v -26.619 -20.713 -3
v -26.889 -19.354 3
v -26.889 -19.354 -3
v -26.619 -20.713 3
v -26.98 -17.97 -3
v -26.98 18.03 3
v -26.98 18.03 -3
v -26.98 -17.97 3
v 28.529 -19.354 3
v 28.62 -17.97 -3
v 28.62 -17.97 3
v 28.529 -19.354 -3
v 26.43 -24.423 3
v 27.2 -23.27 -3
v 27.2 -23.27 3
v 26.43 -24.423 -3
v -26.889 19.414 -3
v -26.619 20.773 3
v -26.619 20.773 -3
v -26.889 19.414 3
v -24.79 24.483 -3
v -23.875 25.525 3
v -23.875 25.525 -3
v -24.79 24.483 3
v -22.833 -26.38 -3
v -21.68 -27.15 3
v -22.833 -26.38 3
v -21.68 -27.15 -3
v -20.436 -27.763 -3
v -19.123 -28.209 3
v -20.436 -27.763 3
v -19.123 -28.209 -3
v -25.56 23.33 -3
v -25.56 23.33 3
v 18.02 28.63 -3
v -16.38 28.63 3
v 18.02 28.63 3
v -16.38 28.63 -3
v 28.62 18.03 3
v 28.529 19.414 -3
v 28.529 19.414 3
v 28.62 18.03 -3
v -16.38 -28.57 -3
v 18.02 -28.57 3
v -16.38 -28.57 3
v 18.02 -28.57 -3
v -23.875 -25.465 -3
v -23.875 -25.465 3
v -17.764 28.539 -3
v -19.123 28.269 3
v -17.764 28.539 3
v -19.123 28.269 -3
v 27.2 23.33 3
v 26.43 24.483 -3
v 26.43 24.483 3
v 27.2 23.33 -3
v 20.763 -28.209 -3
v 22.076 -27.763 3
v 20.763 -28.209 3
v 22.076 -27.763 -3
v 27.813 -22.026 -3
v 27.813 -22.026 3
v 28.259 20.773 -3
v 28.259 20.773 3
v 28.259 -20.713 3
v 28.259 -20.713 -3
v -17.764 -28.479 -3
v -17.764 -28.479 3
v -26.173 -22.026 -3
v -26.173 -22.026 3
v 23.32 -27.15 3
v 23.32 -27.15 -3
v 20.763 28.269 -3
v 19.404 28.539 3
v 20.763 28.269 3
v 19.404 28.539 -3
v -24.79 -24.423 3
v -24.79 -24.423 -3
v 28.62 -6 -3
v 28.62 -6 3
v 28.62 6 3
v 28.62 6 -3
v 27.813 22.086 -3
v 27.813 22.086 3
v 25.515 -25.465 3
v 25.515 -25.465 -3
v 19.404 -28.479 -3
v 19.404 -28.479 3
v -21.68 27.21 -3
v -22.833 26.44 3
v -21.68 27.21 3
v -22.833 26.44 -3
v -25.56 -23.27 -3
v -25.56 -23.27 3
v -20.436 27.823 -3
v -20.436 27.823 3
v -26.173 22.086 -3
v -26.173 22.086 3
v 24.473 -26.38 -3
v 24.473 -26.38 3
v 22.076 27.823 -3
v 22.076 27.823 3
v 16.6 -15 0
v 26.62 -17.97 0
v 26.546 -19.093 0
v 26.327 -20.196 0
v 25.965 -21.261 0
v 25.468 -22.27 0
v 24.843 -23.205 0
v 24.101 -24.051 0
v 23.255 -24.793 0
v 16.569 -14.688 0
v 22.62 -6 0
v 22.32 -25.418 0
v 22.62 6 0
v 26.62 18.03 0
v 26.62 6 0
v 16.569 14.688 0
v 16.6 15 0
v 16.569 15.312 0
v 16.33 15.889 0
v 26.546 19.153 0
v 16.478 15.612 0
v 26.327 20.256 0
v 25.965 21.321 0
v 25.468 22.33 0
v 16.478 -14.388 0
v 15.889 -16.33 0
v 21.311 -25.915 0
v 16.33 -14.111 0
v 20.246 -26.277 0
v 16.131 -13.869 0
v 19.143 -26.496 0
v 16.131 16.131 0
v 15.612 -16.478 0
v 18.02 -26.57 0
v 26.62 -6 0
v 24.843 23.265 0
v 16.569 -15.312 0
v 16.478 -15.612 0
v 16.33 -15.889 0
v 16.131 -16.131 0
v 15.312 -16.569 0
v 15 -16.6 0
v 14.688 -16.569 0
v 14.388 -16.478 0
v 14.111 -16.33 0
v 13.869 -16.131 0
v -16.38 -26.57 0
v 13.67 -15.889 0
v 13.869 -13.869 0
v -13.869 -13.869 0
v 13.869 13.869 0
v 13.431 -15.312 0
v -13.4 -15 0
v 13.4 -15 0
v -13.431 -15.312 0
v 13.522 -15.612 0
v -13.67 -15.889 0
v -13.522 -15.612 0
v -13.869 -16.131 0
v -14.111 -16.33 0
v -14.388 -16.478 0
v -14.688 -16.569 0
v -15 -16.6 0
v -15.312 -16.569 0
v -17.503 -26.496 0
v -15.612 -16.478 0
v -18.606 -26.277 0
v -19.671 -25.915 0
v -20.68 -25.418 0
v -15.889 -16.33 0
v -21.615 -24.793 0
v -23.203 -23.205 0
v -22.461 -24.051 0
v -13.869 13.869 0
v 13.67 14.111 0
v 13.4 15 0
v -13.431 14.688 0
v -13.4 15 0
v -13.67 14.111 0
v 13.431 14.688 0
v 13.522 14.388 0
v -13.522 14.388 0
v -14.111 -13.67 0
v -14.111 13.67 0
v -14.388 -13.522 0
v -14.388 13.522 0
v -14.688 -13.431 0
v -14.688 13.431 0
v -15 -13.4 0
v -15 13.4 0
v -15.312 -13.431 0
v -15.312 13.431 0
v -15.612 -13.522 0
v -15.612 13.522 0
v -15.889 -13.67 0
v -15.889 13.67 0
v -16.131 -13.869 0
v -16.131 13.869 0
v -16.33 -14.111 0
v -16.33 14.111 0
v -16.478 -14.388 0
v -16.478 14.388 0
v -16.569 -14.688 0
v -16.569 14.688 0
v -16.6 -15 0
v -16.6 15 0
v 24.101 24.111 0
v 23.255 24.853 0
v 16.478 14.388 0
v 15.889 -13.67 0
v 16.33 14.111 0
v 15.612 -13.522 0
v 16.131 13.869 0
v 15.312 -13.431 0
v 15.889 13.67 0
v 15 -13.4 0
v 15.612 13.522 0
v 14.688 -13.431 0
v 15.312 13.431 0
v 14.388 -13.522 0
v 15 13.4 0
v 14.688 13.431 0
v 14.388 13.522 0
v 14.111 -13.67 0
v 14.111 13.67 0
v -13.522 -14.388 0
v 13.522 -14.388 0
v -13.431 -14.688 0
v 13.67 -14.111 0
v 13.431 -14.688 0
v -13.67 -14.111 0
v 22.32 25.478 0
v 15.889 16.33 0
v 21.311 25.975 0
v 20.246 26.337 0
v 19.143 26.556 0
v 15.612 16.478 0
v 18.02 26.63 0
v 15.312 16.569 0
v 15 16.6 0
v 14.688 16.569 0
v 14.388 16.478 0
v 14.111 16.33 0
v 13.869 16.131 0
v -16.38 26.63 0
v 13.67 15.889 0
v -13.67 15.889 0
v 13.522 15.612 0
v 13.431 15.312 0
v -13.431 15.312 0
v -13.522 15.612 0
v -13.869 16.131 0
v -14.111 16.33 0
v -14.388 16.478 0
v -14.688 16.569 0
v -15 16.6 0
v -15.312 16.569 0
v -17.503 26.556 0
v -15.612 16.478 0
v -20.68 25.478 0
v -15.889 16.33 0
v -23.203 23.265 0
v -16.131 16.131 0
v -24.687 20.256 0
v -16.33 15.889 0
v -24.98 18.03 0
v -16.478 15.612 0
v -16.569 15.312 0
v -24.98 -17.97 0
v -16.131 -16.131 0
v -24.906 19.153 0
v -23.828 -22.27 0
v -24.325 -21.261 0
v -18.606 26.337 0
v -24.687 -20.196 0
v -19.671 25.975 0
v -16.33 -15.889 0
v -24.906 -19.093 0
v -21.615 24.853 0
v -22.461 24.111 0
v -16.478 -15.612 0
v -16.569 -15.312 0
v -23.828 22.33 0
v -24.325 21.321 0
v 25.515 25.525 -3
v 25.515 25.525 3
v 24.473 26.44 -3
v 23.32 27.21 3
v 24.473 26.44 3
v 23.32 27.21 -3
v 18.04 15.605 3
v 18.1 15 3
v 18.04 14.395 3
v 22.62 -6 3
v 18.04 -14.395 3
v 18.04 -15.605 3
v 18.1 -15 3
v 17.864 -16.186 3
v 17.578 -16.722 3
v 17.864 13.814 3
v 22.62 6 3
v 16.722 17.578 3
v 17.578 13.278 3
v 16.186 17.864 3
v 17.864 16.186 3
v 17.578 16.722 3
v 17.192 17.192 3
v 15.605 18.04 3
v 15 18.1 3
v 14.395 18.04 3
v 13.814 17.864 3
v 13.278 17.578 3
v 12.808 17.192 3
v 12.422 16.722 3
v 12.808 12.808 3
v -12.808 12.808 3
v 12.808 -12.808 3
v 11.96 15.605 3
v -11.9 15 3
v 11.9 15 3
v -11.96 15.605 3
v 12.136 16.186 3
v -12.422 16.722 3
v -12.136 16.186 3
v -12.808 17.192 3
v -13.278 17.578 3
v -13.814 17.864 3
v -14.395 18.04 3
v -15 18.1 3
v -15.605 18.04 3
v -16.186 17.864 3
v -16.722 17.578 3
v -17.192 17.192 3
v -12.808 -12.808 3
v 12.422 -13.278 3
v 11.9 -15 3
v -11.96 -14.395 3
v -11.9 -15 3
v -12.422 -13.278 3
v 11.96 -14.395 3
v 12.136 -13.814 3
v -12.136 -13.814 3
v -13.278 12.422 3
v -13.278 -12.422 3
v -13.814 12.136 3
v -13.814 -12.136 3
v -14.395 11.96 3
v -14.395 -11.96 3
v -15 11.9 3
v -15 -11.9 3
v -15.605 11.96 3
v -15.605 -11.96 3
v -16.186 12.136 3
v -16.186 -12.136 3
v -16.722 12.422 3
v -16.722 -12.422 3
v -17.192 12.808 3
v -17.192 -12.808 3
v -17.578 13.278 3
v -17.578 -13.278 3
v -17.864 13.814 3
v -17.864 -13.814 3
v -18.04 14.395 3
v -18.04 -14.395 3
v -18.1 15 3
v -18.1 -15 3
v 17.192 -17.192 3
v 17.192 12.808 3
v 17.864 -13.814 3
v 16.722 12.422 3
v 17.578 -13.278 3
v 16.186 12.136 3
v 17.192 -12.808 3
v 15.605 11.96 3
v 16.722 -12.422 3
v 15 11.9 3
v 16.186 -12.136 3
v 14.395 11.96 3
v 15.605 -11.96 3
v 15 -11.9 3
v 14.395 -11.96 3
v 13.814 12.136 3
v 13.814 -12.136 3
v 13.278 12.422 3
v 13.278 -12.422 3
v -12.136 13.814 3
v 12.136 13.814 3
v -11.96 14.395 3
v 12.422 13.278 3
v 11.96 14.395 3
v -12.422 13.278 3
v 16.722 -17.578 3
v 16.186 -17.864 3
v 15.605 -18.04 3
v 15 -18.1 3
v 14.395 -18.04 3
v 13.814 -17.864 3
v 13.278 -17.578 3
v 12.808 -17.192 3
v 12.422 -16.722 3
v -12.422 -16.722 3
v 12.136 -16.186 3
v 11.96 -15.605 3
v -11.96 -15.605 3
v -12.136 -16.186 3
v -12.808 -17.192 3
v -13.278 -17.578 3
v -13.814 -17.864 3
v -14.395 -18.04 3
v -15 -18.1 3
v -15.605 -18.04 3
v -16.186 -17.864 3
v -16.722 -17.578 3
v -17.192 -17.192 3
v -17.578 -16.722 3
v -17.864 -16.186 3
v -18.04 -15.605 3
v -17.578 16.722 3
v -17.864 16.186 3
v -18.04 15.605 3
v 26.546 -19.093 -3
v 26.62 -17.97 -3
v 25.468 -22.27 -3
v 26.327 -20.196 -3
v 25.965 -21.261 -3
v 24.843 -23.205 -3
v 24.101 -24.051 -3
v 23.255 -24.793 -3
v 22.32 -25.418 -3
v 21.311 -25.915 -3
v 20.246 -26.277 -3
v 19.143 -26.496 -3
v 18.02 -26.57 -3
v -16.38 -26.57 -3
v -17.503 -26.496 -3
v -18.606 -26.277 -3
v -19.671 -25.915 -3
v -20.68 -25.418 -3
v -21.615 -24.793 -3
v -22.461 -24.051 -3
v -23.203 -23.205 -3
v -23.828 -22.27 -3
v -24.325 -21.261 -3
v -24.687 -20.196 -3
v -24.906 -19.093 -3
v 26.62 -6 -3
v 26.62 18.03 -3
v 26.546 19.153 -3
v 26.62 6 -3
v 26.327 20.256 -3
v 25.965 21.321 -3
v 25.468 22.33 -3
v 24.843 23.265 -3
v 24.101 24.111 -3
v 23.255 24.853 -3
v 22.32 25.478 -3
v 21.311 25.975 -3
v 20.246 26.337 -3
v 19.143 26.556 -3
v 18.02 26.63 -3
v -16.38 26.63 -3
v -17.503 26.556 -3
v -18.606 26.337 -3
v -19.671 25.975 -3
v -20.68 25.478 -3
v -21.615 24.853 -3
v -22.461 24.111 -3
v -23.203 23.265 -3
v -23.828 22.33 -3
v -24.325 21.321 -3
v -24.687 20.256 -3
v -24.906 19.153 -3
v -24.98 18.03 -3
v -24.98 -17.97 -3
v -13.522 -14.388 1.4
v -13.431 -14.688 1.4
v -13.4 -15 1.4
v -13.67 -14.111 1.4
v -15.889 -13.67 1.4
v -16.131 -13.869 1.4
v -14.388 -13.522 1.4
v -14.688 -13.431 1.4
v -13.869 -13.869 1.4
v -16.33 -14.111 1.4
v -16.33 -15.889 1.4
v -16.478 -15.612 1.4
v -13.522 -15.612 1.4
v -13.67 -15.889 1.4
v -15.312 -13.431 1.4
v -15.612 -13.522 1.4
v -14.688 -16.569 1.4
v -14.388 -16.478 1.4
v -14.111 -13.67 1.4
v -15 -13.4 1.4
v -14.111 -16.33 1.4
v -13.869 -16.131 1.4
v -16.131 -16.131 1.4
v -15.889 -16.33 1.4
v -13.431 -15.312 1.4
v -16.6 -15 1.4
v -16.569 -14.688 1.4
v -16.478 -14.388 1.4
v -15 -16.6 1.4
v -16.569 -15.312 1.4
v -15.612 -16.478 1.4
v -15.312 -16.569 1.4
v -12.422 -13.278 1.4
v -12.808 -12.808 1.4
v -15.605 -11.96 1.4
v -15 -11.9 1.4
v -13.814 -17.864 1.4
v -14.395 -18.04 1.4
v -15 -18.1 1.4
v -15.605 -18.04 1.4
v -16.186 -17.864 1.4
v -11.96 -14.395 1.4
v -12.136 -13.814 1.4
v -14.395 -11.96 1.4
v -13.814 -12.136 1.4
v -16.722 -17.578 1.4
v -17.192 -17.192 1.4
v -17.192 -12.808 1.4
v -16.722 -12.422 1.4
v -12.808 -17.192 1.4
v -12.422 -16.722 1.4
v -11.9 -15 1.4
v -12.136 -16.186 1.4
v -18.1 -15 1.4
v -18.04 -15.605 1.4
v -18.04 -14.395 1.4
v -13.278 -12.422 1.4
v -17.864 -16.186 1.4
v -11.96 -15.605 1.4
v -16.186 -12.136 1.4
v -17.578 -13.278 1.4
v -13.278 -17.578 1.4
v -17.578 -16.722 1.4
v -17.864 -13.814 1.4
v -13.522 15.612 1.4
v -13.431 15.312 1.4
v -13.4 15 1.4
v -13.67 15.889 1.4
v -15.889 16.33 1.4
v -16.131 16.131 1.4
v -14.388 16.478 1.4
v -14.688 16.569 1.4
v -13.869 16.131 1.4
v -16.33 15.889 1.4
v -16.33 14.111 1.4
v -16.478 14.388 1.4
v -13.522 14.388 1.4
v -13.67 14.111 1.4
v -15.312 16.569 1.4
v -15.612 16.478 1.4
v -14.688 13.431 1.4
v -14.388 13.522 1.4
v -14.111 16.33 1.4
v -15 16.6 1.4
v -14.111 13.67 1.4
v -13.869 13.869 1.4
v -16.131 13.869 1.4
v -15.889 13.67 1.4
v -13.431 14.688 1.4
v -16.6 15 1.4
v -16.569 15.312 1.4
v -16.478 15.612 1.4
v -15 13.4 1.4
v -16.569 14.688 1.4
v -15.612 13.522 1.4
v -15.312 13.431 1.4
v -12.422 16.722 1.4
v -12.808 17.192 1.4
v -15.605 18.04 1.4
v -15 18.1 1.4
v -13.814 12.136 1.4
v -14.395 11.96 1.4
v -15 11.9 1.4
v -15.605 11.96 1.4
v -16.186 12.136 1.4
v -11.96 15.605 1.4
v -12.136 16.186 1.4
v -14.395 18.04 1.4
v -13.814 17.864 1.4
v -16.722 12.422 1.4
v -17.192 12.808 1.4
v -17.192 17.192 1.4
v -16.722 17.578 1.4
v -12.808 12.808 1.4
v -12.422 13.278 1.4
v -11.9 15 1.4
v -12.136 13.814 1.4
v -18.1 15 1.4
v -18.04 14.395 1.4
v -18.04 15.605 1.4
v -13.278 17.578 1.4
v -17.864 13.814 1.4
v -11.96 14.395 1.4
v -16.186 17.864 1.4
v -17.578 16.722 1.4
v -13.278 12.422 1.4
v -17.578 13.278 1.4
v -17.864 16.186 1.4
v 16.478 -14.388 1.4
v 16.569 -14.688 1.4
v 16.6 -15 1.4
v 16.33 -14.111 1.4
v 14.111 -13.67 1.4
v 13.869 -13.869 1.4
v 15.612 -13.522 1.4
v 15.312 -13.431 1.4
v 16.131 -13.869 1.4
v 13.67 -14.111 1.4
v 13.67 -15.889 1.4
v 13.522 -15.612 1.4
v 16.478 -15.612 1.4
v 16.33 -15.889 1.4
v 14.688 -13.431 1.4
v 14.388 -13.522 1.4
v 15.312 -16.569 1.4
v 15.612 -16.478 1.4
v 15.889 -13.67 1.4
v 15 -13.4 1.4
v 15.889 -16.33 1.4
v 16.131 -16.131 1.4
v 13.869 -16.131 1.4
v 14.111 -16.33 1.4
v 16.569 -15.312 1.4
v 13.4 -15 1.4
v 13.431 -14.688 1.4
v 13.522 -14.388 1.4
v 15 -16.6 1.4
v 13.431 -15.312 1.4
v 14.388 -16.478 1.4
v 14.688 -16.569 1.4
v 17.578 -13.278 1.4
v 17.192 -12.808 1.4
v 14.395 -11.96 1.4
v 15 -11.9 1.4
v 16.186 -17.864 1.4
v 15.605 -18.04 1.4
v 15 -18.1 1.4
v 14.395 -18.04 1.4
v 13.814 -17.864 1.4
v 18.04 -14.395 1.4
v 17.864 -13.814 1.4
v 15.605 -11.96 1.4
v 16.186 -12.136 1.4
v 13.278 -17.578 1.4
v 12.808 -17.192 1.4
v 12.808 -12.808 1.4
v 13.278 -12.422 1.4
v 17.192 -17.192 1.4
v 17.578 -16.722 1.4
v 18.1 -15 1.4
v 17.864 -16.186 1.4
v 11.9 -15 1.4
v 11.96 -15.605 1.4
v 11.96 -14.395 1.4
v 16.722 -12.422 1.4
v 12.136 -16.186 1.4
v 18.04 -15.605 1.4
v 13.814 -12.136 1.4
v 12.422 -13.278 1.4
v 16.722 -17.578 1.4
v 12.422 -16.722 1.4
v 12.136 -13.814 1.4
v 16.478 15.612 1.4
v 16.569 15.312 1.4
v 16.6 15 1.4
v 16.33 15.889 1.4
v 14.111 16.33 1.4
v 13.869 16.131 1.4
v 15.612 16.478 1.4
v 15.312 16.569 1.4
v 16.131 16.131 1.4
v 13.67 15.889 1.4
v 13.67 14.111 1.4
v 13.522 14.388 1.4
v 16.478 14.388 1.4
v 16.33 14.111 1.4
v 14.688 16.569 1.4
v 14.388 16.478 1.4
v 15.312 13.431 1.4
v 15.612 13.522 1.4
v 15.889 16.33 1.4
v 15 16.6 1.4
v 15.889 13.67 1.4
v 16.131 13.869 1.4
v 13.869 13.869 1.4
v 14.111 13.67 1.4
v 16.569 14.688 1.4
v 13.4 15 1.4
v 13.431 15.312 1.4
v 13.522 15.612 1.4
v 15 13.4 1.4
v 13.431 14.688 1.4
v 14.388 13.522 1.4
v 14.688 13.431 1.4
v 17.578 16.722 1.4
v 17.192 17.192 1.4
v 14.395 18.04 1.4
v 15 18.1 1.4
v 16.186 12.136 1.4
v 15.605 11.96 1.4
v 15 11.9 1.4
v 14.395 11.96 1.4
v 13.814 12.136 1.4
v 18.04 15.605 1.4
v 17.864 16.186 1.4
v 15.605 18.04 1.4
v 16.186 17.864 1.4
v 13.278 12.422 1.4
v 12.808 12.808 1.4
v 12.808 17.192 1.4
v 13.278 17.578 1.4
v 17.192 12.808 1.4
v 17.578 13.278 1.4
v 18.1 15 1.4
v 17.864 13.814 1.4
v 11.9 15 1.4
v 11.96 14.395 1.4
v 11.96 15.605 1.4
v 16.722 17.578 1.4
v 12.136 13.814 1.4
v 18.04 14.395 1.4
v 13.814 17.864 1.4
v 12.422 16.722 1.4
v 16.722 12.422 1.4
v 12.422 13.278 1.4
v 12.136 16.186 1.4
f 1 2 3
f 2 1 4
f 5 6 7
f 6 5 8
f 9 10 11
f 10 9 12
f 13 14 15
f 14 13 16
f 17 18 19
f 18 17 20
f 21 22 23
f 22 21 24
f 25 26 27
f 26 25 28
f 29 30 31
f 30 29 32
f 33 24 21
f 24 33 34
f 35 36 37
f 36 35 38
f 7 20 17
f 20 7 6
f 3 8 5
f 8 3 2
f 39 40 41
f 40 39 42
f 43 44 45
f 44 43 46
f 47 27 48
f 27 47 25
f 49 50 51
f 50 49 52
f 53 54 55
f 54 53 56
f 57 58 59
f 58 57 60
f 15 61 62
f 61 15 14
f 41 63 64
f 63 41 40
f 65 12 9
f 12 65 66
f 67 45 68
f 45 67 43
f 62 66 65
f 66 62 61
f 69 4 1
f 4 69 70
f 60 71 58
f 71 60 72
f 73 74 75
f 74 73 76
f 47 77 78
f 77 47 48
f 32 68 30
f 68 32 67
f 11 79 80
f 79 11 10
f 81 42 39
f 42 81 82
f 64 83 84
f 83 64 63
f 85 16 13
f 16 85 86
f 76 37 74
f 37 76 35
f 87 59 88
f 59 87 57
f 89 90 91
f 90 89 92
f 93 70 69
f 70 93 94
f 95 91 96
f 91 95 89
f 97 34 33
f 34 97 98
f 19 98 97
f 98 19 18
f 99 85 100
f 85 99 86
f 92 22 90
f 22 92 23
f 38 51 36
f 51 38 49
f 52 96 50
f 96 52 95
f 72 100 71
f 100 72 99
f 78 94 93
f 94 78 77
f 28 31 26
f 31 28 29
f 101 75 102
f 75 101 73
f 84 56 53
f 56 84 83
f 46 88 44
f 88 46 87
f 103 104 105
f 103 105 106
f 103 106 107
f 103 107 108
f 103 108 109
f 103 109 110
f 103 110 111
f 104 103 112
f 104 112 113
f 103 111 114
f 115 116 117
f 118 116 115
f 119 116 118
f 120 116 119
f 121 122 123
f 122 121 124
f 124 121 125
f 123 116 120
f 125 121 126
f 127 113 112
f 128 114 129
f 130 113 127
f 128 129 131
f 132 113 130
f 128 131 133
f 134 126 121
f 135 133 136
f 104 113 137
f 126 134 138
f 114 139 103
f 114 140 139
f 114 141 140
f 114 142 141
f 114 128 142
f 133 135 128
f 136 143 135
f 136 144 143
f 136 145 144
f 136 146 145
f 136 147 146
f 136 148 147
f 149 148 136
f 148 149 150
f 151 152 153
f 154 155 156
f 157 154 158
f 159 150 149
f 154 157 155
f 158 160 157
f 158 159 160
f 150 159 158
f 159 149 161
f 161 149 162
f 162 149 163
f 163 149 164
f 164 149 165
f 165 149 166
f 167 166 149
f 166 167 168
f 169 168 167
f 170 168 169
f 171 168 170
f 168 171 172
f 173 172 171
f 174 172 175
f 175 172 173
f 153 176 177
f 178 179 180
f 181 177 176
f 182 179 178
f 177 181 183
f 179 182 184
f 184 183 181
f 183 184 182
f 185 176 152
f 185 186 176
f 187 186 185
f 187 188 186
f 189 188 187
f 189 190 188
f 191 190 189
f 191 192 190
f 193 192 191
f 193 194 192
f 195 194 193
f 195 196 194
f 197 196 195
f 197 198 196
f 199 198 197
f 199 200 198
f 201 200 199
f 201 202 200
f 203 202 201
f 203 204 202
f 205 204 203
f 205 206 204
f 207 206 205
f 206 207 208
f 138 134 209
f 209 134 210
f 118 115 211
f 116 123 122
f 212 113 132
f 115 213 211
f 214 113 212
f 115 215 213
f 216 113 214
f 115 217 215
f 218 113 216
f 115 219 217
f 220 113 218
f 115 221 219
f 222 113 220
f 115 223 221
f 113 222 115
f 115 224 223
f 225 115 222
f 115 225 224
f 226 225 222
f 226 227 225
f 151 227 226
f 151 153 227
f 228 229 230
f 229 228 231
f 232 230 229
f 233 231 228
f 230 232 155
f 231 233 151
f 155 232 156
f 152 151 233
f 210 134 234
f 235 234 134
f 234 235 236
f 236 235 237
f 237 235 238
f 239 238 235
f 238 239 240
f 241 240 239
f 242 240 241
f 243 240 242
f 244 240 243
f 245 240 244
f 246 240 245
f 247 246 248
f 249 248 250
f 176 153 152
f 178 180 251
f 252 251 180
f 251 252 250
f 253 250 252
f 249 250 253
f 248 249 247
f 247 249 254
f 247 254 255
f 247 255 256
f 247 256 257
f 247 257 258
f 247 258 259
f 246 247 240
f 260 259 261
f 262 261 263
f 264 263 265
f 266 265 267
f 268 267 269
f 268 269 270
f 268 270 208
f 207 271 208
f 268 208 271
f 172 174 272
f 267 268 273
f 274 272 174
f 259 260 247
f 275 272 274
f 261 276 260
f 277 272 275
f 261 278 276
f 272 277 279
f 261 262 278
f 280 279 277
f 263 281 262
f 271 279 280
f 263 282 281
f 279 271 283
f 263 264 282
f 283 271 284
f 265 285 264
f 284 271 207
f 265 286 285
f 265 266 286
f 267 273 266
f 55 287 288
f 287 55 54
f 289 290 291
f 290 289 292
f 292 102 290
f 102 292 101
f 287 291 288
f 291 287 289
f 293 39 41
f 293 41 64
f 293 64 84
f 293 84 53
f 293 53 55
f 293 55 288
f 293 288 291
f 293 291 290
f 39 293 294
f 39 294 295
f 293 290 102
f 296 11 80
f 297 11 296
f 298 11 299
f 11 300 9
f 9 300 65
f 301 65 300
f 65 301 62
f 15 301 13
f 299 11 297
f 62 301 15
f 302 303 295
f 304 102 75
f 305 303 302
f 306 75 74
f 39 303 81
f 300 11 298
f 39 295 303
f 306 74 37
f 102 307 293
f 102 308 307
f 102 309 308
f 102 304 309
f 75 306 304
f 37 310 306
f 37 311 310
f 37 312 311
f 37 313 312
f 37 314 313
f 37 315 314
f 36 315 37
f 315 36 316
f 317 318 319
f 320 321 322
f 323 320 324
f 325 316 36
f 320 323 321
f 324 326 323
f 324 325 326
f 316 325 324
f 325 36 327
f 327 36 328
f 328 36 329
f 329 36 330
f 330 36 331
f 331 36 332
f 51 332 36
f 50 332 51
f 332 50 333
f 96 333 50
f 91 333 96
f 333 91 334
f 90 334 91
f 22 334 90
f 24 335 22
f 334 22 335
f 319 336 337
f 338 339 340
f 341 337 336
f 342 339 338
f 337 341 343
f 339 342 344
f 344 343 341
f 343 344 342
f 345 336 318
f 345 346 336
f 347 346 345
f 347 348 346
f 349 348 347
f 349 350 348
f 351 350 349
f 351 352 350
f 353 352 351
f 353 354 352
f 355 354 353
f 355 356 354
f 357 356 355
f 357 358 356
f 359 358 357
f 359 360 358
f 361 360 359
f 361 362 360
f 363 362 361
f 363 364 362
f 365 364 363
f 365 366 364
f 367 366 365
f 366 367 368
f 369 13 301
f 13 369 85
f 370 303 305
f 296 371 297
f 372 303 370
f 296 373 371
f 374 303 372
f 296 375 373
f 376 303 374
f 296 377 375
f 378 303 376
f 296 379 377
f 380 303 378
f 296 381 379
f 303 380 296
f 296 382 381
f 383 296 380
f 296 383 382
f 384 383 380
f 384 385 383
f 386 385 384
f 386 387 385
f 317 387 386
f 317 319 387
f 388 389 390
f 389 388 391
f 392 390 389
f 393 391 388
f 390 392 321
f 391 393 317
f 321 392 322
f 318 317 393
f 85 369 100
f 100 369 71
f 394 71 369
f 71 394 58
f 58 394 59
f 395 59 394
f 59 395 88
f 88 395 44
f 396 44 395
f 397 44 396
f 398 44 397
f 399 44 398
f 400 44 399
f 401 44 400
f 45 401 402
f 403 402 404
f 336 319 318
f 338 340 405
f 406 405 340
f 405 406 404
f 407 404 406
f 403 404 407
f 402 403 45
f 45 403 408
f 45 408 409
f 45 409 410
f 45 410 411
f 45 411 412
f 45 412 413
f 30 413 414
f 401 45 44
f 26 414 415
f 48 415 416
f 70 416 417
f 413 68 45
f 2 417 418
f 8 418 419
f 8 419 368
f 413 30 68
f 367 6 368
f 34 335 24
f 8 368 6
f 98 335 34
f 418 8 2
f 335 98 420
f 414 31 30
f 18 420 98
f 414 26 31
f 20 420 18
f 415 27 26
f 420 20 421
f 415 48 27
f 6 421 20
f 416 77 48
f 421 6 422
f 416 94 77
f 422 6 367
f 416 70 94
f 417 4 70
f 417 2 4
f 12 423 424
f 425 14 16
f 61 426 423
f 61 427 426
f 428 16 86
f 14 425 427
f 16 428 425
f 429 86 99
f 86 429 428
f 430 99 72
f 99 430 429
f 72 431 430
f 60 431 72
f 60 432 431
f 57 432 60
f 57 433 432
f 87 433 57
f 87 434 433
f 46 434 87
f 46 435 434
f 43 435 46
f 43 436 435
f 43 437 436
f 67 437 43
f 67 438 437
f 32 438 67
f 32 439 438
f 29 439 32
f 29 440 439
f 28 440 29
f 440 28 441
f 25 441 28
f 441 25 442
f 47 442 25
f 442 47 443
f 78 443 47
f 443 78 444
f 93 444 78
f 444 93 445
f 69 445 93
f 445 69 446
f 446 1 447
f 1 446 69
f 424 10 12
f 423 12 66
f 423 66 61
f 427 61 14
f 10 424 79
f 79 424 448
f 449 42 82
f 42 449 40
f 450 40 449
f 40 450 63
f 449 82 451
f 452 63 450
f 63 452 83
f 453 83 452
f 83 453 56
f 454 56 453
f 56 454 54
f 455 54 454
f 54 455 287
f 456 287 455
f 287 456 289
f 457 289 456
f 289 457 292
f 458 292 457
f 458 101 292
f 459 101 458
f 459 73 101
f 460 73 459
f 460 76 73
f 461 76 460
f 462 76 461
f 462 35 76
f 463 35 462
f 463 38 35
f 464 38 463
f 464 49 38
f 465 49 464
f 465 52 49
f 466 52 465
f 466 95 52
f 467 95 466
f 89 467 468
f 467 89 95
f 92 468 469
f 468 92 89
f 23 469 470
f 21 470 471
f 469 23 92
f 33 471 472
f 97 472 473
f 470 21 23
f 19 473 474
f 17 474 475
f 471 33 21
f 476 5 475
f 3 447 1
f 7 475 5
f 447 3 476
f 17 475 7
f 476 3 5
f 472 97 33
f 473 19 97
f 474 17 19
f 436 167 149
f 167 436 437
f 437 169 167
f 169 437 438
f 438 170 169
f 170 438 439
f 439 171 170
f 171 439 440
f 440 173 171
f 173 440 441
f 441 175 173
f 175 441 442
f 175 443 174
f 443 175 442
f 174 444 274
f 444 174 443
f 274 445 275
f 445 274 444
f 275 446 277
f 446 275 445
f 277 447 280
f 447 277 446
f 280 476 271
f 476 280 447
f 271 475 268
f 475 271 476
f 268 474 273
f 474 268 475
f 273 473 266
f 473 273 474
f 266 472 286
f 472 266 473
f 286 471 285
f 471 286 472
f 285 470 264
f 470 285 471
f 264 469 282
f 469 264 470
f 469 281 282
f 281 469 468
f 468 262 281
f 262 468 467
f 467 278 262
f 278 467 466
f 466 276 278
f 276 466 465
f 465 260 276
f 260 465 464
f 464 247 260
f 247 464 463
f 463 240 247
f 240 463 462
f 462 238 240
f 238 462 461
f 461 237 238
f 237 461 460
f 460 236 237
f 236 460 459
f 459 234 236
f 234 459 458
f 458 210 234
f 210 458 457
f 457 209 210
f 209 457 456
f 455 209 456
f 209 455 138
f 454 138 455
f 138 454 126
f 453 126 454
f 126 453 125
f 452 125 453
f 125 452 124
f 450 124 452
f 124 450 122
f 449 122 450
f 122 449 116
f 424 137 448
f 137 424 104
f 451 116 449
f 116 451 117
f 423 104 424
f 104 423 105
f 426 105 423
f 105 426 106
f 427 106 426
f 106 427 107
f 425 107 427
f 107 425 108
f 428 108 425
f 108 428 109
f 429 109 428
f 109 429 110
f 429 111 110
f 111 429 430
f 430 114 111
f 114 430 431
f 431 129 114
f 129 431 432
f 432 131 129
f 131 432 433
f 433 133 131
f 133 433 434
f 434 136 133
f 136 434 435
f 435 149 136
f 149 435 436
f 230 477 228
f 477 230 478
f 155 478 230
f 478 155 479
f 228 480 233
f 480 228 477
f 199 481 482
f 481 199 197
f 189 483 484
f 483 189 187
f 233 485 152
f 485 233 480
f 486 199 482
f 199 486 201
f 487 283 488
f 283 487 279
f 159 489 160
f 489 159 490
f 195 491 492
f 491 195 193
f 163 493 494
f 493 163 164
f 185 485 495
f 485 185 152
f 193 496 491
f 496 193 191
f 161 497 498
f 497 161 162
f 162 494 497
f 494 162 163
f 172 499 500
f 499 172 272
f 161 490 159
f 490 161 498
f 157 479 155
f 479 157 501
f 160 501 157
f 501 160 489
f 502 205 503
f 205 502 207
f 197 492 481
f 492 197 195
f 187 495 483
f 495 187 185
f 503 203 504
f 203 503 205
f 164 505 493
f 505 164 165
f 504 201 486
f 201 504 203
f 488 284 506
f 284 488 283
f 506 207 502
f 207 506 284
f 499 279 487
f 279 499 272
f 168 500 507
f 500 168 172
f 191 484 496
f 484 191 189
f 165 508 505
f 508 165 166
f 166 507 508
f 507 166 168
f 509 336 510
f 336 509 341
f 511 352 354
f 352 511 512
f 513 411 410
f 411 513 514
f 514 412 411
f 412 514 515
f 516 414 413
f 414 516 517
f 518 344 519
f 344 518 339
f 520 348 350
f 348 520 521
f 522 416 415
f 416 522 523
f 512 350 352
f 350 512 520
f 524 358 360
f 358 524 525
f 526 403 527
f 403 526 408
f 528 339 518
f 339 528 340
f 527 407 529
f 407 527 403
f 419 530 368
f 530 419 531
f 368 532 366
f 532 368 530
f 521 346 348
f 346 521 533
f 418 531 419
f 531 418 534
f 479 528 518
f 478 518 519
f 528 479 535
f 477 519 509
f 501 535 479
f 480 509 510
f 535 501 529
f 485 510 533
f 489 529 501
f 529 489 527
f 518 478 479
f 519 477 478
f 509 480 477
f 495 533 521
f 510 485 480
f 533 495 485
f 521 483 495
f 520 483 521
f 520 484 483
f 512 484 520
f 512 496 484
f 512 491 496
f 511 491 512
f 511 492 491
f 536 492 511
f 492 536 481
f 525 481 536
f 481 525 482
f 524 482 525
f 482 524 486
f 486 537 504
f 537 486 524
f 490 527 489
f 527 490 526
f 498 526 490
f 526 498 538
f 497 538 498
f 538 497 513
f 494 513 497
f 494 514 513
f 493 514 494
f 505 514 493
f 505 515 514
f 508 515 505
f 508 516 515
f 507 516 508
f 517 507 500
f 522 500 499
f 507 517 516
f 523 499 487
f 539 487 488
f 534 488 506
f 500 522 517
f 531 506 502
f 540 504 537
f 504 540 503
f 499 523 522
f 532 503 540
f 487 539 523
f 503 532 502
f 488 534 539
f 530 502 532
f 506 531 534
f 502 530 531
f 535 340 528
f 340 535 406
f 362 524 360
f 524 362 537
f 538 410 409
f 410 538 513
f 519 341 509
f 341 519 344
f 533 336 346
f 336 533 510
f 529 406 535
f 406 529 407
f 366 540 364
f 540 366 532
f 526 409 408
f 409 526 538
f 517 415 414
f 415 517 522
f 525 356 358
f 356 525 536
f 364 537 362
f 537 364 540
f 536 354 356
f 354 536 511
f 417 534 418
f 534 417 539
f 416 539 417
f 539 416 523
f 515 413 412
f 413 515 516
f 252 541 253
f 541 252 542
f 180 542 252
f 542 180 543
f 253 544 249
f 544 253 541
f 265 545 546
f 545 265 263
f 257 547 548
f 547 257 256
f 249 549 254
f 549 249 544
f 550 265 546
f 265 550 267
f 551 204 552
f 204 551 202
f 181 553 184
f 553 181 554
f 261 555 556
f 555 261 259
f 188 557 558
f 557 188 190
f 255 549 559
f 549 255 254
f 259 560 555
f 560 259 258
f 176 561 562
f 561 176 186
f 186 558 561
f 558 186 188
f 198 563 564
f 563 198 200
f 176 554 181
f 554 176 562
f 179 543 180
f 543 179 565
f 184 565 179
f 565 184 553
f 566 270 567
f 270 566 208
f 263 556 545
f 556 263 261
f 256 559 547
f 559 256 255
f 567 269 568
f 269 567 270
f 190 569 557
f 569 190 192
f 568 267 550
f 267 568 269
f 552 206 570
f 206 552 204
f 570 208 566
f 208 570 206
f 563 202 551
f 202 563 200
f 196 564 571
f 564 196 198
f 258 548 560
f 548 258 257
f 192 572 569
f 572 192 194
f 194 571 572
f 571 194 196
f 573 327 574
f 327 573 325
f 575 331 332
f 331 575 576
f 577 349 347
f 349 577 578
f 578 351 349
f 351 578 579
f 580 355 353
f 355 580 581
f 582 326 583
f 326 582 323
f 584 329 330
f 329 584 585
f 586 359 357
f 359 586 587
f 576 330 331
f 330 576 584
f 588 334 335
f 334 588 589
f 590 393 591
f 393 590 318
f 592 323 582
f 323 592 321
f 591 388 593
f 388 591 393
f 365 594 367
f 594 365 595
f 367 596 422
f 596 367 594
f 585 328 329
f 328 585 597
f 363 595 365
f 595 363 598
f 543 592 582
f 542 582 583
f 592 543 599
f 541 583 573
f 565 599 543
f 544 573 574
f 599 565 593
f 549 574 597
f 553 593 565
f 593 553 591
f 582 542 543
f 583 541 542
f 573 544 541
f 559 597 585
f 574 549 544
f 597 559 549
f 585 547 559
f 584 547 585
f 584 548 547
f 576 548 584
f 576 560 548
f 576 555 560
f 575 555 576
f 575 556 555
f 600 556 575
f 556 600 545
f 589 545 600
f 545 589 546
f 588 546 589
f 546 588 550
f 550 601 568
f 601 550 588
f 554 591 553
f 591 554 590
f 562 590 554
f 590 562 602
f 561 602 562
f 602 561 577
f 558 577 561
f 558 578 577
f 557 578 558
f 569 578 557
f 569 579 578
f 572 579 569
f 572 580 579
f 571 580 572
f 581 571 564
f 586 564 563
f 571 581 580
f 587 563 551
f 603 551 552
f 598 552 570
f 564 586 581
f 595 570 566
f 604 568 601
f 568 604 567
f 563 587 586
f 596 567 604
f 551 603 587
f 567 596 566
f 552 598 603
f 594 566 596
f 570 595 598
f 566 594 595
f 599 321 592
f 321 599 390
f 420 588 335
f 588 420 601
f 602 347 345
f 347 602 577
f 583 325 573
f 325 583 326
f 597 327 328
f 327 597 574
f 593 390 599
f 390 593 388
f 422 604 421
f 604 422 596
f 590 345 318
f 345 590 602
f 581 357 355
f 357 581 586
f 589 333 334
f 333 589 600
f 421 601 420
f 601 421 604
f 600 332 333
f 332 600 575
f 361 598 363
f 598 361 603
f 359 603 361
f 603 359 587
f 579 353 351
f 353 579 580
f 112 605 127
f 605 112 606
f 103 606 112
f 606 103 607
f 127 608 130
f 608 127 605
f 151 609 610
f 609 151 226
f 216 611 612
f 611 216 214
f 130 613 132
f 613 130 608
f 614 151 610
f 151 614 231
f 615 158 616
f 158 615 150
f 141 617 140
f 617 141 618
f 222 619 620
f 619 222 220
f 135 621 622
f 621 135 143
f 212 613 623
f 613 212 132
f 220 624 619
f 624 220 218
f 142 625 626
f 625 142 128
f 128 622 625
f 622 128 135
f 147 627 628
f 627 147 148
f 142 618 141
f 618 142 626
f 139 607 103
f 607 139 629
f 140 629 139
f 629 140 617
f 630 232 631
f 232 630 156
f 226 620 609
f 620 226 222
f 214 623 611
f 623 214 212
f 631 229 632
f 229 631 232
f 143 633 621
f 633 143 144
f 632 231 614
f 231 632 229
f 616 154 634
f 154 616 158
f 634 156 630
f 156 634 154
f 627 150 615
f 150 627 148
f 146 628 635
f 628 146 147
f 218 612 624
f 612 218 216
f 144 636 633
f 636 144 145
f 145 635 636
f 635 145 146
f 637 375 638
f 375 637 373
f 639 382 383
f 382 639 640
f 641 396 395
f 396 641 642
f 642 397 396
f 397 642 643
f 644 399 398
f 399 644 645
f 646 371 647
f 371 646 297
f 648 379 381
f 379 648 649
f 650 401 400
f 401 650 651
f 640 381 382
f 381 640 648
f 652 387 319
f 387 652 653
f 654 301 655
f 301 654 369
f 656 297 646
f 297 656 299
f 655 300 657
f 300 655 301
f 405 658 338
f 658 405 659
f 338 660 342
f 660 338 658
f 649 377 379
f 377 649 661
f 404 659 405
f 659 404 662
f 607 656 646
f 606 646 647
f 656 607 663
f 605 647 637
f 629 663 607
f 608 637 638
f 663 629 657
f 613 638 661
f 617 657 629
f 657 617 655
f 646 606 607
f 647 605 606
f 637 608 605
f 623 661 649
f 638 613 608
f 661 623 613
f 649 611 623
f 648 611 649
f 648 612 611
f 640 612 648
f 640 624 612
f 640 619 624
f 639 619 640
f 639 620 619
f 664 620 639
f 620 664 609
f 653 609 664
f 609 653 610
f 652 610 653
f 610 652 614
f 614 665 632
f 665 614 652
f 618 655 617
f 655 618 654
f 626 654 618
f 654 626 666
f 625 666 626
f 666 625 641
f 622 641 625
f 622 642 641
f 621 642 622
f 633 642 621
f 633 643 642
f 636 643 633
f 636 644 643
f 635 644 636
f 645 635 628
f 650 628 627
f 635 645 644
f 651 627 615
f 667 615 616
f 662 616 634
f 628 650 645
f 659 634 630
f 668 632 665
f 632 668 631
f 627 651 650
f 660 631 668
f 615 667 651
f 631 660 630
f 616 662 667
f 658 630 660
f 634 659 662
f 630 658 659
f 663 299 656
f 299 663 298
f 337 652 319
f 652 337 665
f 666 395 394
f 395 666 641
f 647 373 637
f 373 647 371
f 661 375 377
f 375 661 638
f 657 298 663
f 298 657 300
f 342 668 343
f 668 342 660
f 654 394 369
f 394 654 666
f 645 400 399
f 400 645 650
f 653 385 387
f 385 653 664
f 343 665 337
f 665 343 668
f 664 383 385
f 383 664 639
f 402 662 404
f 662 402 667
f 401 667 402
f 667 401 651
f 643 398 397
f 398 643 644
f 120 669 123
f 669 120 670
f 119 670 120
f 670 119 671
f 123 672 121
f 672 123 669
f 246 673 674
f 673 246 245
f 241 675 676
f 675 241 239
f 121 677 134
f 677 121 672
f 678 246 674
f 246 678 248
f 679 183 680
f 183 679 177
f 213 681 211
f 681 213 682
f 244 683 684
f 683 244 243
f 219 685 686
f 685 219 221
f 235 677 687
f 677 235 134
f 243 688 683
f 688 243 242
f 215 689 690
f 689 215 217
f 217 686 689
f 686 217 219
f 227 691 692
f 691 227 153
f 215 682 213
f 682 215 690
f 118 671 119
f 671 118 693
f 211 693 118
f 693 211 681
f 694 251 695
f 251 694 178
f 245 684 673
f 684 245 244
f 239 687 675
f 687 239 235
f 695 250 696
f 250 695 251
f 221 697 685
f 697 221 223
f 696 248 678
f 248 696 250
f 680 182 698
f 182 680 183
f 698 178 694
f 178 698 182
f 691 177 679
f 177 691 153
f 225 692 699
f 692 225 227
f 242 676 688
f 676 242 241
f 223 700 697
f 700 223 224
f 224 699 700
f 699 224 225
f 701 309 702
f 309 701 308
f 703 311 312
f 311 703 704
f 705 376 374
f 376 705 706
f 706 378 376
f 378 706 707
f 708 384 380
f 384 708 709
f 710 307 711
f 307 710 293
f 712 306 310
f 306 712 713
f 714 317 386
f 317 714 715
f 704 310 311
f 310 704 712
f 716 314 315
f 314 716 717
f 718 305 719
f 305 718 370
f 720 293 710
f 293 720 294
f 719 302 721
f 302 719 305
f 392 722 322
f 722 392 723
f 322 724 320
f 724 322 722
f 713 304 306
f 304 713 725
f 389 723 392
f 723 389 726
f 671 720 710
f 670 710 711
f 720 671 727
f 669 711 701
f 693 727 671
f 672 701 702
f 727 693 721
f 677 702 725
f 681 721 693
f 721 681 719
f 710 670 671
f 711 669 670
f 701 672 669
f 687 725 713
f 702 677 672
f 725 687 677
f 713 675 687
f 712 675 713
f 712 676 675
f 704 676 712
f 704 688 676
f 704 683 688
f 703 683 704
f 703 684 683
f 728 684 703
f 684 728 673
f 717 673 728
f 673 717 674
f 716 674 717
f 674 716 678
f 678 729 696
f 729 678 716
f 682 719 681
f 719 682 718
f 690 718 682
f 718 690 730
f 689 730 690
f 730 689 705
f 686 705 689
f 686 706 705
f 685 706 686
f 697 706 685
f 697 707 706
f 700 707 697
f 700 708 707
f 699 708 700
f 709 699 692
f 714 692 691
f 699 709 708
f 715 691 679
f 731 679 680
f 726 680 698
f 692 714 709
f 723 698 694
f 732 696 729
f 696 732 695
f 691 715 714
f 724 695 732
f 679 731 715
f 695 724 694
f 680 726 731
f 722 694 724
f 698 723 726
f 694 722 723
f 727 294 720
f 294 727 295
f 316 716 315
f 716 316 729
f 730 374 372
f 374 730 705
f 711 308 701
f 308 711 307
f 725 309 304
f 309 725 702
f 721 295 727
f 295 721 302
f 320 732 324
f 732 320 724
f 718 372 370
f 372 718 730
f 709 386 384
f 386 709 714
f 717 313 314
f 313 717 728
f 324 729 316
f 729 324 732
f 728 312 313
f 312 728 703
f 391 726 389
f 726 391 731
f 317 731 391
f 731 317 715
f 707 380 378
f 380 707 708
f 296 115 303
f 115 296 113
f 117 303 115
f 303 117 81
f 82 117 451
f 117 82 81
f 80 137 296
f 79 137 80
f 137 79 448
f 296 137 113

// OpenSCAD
// ============================================================================
// top_lid_xiao_001.scad — NẮP ĐẬY TRÊN CÙNG baseline XIAO ESP32-S3 Sense (IN MỚI)
// ----------------------------------------------------------------------------
// Đậy board XIAO ngồi trong top_cap (base Matchboxscope): chắn bụi/sáng từ trên,
// giữ board, luồn cáp USB-C ra. CÙNG giao diện 4×M3 30×30 như lid Matchboxscope
// in sẵn, nhưng IN DÀY hơn cho cứng + có KHE CÁP USB-C + GỜ ĐỊNH VỊ ôm ngoài miệng.
//
// Kết cấu (gốc: TRỤC QUANG = Z tại gốc; MẶT DƯỚI tấm nắp = z=0, +Z lên):
//  - Tấm nắp rounded-rect (footprint = outline base + gờ), dày lid_x_t, z=0..lid_x_t.
//  - GỜ ĐỊNH VỊ thò xuống z=−lid_x_lip_h..0: hốc trong ôm ngoài miệng base
//    (khe lid_x_lip_clr rộng rãi — 4 vít định vị chính, gờ chỉ chắn sáng/bụi).
//    Base chui LÊN vào hốc, mặt trên base chạm mặt dưới tấm nắp.
//  - 4 lỗ THÔNG M3 Ø3.2 (bước 30×30, tâm=trục quang) + khoét đầu vít: vít M3
//    tự-ren vào NỬA TRÊN 4 lỗ base (nửa dưới dành cho vít bích ống — lỗ base sâu
//    12mm nên 2 vít ngắn không chạm nhau; đây đúng ý đồ base+lid gốc Matchboxscope).
//  - KHE CÁP USB-C ở cạnh +X (cắt hết gờ + mép tấm): cáp thoát ra từ dưới tấm.
// Assembly đặt nắp tại mặt trên base (global z = z_tube_top + cap_h).
// ============================================================================
include <../constants.scad>

EPS = 0.05;

// footprint hốc (ôm base) và tấm nắp (= hốc + vách gờ)
recess_dims = [cap_outline[0] + 2*lid_x_lip_clr, cap_outline[1] + 2*lid_x_lip_clr];
recess_r    = cap_corner_r + lid_x_lip_clr;
outer_dims  = [recess_dims[0] + 2*lid_x_lip_wall, recess_dims[1] + 2*lid_x_lip_wall];
outer_r     = recess_r + lid_x_lip_wall;

module rrect(dims, r) {
    hull() for (sx = [1, -1], sy = [1, -1])
        translate([sx*(dims[0]/2 - r), sy*(dims[1]/2 - r)]) circle(r = r, $fn = 48);
}

module top_lid_xiao() {
    color(col_plastic) difference() {
        union() {
            // Tấm nắp (z=0..lid_x_t)
            translate([cap_outline_off[0], cap_outline_off[1], 0])
                linear_extrude(lid_x_t) rrect(outer_dims, outer_r);
            // Gờ định vị (vành thò xuống z=−lip_h..0)
            translate([cap_outline_off[0], cap_outline_off[1], -lid_x_lip_h])
                linear_extrude(lid_x_lip_h)
                    difference() {
                        rrect(outer_dims, outer_r);
                        rrect(recess_dims, recess_r);
                    }
        }
        // 4 lỗ thông M3 (xuyên cả gờ+tấm) + khoét đầu vít từ mặt trên
        m3_mount_pattern() {
            translate([0, 0, -lid_x_lip_h - EPS])
                cylinder(d = lid_x_screw_d, h = lid_x_lip_h + lid_x_t + 2*EPS, $fn = 32);
            translate([0, 0, lid_x_t - lid_x_cbore_h])
                cylinder(d = lid_x_cbore_d, h = lid_x_cbore_h + EPS, $fn = 32);
        }
        // Khe cáp USB-C cạnh +X (cắt hết gờ + mép tấm, suốt chiều cao)
        translate([cap_outline_off[0] + outer_dims[0]/2 - lid_x_lip_wall - 4,
                   -lid_x_usb_w/2, -lid_x_lip_h - EPS])
            cube([lid_x_lip_wall + 6, lid_x_usb_w, lid_x_lip_h + lid_x_t + 2*EPS]);
    }
}

top_lid_xiao();
